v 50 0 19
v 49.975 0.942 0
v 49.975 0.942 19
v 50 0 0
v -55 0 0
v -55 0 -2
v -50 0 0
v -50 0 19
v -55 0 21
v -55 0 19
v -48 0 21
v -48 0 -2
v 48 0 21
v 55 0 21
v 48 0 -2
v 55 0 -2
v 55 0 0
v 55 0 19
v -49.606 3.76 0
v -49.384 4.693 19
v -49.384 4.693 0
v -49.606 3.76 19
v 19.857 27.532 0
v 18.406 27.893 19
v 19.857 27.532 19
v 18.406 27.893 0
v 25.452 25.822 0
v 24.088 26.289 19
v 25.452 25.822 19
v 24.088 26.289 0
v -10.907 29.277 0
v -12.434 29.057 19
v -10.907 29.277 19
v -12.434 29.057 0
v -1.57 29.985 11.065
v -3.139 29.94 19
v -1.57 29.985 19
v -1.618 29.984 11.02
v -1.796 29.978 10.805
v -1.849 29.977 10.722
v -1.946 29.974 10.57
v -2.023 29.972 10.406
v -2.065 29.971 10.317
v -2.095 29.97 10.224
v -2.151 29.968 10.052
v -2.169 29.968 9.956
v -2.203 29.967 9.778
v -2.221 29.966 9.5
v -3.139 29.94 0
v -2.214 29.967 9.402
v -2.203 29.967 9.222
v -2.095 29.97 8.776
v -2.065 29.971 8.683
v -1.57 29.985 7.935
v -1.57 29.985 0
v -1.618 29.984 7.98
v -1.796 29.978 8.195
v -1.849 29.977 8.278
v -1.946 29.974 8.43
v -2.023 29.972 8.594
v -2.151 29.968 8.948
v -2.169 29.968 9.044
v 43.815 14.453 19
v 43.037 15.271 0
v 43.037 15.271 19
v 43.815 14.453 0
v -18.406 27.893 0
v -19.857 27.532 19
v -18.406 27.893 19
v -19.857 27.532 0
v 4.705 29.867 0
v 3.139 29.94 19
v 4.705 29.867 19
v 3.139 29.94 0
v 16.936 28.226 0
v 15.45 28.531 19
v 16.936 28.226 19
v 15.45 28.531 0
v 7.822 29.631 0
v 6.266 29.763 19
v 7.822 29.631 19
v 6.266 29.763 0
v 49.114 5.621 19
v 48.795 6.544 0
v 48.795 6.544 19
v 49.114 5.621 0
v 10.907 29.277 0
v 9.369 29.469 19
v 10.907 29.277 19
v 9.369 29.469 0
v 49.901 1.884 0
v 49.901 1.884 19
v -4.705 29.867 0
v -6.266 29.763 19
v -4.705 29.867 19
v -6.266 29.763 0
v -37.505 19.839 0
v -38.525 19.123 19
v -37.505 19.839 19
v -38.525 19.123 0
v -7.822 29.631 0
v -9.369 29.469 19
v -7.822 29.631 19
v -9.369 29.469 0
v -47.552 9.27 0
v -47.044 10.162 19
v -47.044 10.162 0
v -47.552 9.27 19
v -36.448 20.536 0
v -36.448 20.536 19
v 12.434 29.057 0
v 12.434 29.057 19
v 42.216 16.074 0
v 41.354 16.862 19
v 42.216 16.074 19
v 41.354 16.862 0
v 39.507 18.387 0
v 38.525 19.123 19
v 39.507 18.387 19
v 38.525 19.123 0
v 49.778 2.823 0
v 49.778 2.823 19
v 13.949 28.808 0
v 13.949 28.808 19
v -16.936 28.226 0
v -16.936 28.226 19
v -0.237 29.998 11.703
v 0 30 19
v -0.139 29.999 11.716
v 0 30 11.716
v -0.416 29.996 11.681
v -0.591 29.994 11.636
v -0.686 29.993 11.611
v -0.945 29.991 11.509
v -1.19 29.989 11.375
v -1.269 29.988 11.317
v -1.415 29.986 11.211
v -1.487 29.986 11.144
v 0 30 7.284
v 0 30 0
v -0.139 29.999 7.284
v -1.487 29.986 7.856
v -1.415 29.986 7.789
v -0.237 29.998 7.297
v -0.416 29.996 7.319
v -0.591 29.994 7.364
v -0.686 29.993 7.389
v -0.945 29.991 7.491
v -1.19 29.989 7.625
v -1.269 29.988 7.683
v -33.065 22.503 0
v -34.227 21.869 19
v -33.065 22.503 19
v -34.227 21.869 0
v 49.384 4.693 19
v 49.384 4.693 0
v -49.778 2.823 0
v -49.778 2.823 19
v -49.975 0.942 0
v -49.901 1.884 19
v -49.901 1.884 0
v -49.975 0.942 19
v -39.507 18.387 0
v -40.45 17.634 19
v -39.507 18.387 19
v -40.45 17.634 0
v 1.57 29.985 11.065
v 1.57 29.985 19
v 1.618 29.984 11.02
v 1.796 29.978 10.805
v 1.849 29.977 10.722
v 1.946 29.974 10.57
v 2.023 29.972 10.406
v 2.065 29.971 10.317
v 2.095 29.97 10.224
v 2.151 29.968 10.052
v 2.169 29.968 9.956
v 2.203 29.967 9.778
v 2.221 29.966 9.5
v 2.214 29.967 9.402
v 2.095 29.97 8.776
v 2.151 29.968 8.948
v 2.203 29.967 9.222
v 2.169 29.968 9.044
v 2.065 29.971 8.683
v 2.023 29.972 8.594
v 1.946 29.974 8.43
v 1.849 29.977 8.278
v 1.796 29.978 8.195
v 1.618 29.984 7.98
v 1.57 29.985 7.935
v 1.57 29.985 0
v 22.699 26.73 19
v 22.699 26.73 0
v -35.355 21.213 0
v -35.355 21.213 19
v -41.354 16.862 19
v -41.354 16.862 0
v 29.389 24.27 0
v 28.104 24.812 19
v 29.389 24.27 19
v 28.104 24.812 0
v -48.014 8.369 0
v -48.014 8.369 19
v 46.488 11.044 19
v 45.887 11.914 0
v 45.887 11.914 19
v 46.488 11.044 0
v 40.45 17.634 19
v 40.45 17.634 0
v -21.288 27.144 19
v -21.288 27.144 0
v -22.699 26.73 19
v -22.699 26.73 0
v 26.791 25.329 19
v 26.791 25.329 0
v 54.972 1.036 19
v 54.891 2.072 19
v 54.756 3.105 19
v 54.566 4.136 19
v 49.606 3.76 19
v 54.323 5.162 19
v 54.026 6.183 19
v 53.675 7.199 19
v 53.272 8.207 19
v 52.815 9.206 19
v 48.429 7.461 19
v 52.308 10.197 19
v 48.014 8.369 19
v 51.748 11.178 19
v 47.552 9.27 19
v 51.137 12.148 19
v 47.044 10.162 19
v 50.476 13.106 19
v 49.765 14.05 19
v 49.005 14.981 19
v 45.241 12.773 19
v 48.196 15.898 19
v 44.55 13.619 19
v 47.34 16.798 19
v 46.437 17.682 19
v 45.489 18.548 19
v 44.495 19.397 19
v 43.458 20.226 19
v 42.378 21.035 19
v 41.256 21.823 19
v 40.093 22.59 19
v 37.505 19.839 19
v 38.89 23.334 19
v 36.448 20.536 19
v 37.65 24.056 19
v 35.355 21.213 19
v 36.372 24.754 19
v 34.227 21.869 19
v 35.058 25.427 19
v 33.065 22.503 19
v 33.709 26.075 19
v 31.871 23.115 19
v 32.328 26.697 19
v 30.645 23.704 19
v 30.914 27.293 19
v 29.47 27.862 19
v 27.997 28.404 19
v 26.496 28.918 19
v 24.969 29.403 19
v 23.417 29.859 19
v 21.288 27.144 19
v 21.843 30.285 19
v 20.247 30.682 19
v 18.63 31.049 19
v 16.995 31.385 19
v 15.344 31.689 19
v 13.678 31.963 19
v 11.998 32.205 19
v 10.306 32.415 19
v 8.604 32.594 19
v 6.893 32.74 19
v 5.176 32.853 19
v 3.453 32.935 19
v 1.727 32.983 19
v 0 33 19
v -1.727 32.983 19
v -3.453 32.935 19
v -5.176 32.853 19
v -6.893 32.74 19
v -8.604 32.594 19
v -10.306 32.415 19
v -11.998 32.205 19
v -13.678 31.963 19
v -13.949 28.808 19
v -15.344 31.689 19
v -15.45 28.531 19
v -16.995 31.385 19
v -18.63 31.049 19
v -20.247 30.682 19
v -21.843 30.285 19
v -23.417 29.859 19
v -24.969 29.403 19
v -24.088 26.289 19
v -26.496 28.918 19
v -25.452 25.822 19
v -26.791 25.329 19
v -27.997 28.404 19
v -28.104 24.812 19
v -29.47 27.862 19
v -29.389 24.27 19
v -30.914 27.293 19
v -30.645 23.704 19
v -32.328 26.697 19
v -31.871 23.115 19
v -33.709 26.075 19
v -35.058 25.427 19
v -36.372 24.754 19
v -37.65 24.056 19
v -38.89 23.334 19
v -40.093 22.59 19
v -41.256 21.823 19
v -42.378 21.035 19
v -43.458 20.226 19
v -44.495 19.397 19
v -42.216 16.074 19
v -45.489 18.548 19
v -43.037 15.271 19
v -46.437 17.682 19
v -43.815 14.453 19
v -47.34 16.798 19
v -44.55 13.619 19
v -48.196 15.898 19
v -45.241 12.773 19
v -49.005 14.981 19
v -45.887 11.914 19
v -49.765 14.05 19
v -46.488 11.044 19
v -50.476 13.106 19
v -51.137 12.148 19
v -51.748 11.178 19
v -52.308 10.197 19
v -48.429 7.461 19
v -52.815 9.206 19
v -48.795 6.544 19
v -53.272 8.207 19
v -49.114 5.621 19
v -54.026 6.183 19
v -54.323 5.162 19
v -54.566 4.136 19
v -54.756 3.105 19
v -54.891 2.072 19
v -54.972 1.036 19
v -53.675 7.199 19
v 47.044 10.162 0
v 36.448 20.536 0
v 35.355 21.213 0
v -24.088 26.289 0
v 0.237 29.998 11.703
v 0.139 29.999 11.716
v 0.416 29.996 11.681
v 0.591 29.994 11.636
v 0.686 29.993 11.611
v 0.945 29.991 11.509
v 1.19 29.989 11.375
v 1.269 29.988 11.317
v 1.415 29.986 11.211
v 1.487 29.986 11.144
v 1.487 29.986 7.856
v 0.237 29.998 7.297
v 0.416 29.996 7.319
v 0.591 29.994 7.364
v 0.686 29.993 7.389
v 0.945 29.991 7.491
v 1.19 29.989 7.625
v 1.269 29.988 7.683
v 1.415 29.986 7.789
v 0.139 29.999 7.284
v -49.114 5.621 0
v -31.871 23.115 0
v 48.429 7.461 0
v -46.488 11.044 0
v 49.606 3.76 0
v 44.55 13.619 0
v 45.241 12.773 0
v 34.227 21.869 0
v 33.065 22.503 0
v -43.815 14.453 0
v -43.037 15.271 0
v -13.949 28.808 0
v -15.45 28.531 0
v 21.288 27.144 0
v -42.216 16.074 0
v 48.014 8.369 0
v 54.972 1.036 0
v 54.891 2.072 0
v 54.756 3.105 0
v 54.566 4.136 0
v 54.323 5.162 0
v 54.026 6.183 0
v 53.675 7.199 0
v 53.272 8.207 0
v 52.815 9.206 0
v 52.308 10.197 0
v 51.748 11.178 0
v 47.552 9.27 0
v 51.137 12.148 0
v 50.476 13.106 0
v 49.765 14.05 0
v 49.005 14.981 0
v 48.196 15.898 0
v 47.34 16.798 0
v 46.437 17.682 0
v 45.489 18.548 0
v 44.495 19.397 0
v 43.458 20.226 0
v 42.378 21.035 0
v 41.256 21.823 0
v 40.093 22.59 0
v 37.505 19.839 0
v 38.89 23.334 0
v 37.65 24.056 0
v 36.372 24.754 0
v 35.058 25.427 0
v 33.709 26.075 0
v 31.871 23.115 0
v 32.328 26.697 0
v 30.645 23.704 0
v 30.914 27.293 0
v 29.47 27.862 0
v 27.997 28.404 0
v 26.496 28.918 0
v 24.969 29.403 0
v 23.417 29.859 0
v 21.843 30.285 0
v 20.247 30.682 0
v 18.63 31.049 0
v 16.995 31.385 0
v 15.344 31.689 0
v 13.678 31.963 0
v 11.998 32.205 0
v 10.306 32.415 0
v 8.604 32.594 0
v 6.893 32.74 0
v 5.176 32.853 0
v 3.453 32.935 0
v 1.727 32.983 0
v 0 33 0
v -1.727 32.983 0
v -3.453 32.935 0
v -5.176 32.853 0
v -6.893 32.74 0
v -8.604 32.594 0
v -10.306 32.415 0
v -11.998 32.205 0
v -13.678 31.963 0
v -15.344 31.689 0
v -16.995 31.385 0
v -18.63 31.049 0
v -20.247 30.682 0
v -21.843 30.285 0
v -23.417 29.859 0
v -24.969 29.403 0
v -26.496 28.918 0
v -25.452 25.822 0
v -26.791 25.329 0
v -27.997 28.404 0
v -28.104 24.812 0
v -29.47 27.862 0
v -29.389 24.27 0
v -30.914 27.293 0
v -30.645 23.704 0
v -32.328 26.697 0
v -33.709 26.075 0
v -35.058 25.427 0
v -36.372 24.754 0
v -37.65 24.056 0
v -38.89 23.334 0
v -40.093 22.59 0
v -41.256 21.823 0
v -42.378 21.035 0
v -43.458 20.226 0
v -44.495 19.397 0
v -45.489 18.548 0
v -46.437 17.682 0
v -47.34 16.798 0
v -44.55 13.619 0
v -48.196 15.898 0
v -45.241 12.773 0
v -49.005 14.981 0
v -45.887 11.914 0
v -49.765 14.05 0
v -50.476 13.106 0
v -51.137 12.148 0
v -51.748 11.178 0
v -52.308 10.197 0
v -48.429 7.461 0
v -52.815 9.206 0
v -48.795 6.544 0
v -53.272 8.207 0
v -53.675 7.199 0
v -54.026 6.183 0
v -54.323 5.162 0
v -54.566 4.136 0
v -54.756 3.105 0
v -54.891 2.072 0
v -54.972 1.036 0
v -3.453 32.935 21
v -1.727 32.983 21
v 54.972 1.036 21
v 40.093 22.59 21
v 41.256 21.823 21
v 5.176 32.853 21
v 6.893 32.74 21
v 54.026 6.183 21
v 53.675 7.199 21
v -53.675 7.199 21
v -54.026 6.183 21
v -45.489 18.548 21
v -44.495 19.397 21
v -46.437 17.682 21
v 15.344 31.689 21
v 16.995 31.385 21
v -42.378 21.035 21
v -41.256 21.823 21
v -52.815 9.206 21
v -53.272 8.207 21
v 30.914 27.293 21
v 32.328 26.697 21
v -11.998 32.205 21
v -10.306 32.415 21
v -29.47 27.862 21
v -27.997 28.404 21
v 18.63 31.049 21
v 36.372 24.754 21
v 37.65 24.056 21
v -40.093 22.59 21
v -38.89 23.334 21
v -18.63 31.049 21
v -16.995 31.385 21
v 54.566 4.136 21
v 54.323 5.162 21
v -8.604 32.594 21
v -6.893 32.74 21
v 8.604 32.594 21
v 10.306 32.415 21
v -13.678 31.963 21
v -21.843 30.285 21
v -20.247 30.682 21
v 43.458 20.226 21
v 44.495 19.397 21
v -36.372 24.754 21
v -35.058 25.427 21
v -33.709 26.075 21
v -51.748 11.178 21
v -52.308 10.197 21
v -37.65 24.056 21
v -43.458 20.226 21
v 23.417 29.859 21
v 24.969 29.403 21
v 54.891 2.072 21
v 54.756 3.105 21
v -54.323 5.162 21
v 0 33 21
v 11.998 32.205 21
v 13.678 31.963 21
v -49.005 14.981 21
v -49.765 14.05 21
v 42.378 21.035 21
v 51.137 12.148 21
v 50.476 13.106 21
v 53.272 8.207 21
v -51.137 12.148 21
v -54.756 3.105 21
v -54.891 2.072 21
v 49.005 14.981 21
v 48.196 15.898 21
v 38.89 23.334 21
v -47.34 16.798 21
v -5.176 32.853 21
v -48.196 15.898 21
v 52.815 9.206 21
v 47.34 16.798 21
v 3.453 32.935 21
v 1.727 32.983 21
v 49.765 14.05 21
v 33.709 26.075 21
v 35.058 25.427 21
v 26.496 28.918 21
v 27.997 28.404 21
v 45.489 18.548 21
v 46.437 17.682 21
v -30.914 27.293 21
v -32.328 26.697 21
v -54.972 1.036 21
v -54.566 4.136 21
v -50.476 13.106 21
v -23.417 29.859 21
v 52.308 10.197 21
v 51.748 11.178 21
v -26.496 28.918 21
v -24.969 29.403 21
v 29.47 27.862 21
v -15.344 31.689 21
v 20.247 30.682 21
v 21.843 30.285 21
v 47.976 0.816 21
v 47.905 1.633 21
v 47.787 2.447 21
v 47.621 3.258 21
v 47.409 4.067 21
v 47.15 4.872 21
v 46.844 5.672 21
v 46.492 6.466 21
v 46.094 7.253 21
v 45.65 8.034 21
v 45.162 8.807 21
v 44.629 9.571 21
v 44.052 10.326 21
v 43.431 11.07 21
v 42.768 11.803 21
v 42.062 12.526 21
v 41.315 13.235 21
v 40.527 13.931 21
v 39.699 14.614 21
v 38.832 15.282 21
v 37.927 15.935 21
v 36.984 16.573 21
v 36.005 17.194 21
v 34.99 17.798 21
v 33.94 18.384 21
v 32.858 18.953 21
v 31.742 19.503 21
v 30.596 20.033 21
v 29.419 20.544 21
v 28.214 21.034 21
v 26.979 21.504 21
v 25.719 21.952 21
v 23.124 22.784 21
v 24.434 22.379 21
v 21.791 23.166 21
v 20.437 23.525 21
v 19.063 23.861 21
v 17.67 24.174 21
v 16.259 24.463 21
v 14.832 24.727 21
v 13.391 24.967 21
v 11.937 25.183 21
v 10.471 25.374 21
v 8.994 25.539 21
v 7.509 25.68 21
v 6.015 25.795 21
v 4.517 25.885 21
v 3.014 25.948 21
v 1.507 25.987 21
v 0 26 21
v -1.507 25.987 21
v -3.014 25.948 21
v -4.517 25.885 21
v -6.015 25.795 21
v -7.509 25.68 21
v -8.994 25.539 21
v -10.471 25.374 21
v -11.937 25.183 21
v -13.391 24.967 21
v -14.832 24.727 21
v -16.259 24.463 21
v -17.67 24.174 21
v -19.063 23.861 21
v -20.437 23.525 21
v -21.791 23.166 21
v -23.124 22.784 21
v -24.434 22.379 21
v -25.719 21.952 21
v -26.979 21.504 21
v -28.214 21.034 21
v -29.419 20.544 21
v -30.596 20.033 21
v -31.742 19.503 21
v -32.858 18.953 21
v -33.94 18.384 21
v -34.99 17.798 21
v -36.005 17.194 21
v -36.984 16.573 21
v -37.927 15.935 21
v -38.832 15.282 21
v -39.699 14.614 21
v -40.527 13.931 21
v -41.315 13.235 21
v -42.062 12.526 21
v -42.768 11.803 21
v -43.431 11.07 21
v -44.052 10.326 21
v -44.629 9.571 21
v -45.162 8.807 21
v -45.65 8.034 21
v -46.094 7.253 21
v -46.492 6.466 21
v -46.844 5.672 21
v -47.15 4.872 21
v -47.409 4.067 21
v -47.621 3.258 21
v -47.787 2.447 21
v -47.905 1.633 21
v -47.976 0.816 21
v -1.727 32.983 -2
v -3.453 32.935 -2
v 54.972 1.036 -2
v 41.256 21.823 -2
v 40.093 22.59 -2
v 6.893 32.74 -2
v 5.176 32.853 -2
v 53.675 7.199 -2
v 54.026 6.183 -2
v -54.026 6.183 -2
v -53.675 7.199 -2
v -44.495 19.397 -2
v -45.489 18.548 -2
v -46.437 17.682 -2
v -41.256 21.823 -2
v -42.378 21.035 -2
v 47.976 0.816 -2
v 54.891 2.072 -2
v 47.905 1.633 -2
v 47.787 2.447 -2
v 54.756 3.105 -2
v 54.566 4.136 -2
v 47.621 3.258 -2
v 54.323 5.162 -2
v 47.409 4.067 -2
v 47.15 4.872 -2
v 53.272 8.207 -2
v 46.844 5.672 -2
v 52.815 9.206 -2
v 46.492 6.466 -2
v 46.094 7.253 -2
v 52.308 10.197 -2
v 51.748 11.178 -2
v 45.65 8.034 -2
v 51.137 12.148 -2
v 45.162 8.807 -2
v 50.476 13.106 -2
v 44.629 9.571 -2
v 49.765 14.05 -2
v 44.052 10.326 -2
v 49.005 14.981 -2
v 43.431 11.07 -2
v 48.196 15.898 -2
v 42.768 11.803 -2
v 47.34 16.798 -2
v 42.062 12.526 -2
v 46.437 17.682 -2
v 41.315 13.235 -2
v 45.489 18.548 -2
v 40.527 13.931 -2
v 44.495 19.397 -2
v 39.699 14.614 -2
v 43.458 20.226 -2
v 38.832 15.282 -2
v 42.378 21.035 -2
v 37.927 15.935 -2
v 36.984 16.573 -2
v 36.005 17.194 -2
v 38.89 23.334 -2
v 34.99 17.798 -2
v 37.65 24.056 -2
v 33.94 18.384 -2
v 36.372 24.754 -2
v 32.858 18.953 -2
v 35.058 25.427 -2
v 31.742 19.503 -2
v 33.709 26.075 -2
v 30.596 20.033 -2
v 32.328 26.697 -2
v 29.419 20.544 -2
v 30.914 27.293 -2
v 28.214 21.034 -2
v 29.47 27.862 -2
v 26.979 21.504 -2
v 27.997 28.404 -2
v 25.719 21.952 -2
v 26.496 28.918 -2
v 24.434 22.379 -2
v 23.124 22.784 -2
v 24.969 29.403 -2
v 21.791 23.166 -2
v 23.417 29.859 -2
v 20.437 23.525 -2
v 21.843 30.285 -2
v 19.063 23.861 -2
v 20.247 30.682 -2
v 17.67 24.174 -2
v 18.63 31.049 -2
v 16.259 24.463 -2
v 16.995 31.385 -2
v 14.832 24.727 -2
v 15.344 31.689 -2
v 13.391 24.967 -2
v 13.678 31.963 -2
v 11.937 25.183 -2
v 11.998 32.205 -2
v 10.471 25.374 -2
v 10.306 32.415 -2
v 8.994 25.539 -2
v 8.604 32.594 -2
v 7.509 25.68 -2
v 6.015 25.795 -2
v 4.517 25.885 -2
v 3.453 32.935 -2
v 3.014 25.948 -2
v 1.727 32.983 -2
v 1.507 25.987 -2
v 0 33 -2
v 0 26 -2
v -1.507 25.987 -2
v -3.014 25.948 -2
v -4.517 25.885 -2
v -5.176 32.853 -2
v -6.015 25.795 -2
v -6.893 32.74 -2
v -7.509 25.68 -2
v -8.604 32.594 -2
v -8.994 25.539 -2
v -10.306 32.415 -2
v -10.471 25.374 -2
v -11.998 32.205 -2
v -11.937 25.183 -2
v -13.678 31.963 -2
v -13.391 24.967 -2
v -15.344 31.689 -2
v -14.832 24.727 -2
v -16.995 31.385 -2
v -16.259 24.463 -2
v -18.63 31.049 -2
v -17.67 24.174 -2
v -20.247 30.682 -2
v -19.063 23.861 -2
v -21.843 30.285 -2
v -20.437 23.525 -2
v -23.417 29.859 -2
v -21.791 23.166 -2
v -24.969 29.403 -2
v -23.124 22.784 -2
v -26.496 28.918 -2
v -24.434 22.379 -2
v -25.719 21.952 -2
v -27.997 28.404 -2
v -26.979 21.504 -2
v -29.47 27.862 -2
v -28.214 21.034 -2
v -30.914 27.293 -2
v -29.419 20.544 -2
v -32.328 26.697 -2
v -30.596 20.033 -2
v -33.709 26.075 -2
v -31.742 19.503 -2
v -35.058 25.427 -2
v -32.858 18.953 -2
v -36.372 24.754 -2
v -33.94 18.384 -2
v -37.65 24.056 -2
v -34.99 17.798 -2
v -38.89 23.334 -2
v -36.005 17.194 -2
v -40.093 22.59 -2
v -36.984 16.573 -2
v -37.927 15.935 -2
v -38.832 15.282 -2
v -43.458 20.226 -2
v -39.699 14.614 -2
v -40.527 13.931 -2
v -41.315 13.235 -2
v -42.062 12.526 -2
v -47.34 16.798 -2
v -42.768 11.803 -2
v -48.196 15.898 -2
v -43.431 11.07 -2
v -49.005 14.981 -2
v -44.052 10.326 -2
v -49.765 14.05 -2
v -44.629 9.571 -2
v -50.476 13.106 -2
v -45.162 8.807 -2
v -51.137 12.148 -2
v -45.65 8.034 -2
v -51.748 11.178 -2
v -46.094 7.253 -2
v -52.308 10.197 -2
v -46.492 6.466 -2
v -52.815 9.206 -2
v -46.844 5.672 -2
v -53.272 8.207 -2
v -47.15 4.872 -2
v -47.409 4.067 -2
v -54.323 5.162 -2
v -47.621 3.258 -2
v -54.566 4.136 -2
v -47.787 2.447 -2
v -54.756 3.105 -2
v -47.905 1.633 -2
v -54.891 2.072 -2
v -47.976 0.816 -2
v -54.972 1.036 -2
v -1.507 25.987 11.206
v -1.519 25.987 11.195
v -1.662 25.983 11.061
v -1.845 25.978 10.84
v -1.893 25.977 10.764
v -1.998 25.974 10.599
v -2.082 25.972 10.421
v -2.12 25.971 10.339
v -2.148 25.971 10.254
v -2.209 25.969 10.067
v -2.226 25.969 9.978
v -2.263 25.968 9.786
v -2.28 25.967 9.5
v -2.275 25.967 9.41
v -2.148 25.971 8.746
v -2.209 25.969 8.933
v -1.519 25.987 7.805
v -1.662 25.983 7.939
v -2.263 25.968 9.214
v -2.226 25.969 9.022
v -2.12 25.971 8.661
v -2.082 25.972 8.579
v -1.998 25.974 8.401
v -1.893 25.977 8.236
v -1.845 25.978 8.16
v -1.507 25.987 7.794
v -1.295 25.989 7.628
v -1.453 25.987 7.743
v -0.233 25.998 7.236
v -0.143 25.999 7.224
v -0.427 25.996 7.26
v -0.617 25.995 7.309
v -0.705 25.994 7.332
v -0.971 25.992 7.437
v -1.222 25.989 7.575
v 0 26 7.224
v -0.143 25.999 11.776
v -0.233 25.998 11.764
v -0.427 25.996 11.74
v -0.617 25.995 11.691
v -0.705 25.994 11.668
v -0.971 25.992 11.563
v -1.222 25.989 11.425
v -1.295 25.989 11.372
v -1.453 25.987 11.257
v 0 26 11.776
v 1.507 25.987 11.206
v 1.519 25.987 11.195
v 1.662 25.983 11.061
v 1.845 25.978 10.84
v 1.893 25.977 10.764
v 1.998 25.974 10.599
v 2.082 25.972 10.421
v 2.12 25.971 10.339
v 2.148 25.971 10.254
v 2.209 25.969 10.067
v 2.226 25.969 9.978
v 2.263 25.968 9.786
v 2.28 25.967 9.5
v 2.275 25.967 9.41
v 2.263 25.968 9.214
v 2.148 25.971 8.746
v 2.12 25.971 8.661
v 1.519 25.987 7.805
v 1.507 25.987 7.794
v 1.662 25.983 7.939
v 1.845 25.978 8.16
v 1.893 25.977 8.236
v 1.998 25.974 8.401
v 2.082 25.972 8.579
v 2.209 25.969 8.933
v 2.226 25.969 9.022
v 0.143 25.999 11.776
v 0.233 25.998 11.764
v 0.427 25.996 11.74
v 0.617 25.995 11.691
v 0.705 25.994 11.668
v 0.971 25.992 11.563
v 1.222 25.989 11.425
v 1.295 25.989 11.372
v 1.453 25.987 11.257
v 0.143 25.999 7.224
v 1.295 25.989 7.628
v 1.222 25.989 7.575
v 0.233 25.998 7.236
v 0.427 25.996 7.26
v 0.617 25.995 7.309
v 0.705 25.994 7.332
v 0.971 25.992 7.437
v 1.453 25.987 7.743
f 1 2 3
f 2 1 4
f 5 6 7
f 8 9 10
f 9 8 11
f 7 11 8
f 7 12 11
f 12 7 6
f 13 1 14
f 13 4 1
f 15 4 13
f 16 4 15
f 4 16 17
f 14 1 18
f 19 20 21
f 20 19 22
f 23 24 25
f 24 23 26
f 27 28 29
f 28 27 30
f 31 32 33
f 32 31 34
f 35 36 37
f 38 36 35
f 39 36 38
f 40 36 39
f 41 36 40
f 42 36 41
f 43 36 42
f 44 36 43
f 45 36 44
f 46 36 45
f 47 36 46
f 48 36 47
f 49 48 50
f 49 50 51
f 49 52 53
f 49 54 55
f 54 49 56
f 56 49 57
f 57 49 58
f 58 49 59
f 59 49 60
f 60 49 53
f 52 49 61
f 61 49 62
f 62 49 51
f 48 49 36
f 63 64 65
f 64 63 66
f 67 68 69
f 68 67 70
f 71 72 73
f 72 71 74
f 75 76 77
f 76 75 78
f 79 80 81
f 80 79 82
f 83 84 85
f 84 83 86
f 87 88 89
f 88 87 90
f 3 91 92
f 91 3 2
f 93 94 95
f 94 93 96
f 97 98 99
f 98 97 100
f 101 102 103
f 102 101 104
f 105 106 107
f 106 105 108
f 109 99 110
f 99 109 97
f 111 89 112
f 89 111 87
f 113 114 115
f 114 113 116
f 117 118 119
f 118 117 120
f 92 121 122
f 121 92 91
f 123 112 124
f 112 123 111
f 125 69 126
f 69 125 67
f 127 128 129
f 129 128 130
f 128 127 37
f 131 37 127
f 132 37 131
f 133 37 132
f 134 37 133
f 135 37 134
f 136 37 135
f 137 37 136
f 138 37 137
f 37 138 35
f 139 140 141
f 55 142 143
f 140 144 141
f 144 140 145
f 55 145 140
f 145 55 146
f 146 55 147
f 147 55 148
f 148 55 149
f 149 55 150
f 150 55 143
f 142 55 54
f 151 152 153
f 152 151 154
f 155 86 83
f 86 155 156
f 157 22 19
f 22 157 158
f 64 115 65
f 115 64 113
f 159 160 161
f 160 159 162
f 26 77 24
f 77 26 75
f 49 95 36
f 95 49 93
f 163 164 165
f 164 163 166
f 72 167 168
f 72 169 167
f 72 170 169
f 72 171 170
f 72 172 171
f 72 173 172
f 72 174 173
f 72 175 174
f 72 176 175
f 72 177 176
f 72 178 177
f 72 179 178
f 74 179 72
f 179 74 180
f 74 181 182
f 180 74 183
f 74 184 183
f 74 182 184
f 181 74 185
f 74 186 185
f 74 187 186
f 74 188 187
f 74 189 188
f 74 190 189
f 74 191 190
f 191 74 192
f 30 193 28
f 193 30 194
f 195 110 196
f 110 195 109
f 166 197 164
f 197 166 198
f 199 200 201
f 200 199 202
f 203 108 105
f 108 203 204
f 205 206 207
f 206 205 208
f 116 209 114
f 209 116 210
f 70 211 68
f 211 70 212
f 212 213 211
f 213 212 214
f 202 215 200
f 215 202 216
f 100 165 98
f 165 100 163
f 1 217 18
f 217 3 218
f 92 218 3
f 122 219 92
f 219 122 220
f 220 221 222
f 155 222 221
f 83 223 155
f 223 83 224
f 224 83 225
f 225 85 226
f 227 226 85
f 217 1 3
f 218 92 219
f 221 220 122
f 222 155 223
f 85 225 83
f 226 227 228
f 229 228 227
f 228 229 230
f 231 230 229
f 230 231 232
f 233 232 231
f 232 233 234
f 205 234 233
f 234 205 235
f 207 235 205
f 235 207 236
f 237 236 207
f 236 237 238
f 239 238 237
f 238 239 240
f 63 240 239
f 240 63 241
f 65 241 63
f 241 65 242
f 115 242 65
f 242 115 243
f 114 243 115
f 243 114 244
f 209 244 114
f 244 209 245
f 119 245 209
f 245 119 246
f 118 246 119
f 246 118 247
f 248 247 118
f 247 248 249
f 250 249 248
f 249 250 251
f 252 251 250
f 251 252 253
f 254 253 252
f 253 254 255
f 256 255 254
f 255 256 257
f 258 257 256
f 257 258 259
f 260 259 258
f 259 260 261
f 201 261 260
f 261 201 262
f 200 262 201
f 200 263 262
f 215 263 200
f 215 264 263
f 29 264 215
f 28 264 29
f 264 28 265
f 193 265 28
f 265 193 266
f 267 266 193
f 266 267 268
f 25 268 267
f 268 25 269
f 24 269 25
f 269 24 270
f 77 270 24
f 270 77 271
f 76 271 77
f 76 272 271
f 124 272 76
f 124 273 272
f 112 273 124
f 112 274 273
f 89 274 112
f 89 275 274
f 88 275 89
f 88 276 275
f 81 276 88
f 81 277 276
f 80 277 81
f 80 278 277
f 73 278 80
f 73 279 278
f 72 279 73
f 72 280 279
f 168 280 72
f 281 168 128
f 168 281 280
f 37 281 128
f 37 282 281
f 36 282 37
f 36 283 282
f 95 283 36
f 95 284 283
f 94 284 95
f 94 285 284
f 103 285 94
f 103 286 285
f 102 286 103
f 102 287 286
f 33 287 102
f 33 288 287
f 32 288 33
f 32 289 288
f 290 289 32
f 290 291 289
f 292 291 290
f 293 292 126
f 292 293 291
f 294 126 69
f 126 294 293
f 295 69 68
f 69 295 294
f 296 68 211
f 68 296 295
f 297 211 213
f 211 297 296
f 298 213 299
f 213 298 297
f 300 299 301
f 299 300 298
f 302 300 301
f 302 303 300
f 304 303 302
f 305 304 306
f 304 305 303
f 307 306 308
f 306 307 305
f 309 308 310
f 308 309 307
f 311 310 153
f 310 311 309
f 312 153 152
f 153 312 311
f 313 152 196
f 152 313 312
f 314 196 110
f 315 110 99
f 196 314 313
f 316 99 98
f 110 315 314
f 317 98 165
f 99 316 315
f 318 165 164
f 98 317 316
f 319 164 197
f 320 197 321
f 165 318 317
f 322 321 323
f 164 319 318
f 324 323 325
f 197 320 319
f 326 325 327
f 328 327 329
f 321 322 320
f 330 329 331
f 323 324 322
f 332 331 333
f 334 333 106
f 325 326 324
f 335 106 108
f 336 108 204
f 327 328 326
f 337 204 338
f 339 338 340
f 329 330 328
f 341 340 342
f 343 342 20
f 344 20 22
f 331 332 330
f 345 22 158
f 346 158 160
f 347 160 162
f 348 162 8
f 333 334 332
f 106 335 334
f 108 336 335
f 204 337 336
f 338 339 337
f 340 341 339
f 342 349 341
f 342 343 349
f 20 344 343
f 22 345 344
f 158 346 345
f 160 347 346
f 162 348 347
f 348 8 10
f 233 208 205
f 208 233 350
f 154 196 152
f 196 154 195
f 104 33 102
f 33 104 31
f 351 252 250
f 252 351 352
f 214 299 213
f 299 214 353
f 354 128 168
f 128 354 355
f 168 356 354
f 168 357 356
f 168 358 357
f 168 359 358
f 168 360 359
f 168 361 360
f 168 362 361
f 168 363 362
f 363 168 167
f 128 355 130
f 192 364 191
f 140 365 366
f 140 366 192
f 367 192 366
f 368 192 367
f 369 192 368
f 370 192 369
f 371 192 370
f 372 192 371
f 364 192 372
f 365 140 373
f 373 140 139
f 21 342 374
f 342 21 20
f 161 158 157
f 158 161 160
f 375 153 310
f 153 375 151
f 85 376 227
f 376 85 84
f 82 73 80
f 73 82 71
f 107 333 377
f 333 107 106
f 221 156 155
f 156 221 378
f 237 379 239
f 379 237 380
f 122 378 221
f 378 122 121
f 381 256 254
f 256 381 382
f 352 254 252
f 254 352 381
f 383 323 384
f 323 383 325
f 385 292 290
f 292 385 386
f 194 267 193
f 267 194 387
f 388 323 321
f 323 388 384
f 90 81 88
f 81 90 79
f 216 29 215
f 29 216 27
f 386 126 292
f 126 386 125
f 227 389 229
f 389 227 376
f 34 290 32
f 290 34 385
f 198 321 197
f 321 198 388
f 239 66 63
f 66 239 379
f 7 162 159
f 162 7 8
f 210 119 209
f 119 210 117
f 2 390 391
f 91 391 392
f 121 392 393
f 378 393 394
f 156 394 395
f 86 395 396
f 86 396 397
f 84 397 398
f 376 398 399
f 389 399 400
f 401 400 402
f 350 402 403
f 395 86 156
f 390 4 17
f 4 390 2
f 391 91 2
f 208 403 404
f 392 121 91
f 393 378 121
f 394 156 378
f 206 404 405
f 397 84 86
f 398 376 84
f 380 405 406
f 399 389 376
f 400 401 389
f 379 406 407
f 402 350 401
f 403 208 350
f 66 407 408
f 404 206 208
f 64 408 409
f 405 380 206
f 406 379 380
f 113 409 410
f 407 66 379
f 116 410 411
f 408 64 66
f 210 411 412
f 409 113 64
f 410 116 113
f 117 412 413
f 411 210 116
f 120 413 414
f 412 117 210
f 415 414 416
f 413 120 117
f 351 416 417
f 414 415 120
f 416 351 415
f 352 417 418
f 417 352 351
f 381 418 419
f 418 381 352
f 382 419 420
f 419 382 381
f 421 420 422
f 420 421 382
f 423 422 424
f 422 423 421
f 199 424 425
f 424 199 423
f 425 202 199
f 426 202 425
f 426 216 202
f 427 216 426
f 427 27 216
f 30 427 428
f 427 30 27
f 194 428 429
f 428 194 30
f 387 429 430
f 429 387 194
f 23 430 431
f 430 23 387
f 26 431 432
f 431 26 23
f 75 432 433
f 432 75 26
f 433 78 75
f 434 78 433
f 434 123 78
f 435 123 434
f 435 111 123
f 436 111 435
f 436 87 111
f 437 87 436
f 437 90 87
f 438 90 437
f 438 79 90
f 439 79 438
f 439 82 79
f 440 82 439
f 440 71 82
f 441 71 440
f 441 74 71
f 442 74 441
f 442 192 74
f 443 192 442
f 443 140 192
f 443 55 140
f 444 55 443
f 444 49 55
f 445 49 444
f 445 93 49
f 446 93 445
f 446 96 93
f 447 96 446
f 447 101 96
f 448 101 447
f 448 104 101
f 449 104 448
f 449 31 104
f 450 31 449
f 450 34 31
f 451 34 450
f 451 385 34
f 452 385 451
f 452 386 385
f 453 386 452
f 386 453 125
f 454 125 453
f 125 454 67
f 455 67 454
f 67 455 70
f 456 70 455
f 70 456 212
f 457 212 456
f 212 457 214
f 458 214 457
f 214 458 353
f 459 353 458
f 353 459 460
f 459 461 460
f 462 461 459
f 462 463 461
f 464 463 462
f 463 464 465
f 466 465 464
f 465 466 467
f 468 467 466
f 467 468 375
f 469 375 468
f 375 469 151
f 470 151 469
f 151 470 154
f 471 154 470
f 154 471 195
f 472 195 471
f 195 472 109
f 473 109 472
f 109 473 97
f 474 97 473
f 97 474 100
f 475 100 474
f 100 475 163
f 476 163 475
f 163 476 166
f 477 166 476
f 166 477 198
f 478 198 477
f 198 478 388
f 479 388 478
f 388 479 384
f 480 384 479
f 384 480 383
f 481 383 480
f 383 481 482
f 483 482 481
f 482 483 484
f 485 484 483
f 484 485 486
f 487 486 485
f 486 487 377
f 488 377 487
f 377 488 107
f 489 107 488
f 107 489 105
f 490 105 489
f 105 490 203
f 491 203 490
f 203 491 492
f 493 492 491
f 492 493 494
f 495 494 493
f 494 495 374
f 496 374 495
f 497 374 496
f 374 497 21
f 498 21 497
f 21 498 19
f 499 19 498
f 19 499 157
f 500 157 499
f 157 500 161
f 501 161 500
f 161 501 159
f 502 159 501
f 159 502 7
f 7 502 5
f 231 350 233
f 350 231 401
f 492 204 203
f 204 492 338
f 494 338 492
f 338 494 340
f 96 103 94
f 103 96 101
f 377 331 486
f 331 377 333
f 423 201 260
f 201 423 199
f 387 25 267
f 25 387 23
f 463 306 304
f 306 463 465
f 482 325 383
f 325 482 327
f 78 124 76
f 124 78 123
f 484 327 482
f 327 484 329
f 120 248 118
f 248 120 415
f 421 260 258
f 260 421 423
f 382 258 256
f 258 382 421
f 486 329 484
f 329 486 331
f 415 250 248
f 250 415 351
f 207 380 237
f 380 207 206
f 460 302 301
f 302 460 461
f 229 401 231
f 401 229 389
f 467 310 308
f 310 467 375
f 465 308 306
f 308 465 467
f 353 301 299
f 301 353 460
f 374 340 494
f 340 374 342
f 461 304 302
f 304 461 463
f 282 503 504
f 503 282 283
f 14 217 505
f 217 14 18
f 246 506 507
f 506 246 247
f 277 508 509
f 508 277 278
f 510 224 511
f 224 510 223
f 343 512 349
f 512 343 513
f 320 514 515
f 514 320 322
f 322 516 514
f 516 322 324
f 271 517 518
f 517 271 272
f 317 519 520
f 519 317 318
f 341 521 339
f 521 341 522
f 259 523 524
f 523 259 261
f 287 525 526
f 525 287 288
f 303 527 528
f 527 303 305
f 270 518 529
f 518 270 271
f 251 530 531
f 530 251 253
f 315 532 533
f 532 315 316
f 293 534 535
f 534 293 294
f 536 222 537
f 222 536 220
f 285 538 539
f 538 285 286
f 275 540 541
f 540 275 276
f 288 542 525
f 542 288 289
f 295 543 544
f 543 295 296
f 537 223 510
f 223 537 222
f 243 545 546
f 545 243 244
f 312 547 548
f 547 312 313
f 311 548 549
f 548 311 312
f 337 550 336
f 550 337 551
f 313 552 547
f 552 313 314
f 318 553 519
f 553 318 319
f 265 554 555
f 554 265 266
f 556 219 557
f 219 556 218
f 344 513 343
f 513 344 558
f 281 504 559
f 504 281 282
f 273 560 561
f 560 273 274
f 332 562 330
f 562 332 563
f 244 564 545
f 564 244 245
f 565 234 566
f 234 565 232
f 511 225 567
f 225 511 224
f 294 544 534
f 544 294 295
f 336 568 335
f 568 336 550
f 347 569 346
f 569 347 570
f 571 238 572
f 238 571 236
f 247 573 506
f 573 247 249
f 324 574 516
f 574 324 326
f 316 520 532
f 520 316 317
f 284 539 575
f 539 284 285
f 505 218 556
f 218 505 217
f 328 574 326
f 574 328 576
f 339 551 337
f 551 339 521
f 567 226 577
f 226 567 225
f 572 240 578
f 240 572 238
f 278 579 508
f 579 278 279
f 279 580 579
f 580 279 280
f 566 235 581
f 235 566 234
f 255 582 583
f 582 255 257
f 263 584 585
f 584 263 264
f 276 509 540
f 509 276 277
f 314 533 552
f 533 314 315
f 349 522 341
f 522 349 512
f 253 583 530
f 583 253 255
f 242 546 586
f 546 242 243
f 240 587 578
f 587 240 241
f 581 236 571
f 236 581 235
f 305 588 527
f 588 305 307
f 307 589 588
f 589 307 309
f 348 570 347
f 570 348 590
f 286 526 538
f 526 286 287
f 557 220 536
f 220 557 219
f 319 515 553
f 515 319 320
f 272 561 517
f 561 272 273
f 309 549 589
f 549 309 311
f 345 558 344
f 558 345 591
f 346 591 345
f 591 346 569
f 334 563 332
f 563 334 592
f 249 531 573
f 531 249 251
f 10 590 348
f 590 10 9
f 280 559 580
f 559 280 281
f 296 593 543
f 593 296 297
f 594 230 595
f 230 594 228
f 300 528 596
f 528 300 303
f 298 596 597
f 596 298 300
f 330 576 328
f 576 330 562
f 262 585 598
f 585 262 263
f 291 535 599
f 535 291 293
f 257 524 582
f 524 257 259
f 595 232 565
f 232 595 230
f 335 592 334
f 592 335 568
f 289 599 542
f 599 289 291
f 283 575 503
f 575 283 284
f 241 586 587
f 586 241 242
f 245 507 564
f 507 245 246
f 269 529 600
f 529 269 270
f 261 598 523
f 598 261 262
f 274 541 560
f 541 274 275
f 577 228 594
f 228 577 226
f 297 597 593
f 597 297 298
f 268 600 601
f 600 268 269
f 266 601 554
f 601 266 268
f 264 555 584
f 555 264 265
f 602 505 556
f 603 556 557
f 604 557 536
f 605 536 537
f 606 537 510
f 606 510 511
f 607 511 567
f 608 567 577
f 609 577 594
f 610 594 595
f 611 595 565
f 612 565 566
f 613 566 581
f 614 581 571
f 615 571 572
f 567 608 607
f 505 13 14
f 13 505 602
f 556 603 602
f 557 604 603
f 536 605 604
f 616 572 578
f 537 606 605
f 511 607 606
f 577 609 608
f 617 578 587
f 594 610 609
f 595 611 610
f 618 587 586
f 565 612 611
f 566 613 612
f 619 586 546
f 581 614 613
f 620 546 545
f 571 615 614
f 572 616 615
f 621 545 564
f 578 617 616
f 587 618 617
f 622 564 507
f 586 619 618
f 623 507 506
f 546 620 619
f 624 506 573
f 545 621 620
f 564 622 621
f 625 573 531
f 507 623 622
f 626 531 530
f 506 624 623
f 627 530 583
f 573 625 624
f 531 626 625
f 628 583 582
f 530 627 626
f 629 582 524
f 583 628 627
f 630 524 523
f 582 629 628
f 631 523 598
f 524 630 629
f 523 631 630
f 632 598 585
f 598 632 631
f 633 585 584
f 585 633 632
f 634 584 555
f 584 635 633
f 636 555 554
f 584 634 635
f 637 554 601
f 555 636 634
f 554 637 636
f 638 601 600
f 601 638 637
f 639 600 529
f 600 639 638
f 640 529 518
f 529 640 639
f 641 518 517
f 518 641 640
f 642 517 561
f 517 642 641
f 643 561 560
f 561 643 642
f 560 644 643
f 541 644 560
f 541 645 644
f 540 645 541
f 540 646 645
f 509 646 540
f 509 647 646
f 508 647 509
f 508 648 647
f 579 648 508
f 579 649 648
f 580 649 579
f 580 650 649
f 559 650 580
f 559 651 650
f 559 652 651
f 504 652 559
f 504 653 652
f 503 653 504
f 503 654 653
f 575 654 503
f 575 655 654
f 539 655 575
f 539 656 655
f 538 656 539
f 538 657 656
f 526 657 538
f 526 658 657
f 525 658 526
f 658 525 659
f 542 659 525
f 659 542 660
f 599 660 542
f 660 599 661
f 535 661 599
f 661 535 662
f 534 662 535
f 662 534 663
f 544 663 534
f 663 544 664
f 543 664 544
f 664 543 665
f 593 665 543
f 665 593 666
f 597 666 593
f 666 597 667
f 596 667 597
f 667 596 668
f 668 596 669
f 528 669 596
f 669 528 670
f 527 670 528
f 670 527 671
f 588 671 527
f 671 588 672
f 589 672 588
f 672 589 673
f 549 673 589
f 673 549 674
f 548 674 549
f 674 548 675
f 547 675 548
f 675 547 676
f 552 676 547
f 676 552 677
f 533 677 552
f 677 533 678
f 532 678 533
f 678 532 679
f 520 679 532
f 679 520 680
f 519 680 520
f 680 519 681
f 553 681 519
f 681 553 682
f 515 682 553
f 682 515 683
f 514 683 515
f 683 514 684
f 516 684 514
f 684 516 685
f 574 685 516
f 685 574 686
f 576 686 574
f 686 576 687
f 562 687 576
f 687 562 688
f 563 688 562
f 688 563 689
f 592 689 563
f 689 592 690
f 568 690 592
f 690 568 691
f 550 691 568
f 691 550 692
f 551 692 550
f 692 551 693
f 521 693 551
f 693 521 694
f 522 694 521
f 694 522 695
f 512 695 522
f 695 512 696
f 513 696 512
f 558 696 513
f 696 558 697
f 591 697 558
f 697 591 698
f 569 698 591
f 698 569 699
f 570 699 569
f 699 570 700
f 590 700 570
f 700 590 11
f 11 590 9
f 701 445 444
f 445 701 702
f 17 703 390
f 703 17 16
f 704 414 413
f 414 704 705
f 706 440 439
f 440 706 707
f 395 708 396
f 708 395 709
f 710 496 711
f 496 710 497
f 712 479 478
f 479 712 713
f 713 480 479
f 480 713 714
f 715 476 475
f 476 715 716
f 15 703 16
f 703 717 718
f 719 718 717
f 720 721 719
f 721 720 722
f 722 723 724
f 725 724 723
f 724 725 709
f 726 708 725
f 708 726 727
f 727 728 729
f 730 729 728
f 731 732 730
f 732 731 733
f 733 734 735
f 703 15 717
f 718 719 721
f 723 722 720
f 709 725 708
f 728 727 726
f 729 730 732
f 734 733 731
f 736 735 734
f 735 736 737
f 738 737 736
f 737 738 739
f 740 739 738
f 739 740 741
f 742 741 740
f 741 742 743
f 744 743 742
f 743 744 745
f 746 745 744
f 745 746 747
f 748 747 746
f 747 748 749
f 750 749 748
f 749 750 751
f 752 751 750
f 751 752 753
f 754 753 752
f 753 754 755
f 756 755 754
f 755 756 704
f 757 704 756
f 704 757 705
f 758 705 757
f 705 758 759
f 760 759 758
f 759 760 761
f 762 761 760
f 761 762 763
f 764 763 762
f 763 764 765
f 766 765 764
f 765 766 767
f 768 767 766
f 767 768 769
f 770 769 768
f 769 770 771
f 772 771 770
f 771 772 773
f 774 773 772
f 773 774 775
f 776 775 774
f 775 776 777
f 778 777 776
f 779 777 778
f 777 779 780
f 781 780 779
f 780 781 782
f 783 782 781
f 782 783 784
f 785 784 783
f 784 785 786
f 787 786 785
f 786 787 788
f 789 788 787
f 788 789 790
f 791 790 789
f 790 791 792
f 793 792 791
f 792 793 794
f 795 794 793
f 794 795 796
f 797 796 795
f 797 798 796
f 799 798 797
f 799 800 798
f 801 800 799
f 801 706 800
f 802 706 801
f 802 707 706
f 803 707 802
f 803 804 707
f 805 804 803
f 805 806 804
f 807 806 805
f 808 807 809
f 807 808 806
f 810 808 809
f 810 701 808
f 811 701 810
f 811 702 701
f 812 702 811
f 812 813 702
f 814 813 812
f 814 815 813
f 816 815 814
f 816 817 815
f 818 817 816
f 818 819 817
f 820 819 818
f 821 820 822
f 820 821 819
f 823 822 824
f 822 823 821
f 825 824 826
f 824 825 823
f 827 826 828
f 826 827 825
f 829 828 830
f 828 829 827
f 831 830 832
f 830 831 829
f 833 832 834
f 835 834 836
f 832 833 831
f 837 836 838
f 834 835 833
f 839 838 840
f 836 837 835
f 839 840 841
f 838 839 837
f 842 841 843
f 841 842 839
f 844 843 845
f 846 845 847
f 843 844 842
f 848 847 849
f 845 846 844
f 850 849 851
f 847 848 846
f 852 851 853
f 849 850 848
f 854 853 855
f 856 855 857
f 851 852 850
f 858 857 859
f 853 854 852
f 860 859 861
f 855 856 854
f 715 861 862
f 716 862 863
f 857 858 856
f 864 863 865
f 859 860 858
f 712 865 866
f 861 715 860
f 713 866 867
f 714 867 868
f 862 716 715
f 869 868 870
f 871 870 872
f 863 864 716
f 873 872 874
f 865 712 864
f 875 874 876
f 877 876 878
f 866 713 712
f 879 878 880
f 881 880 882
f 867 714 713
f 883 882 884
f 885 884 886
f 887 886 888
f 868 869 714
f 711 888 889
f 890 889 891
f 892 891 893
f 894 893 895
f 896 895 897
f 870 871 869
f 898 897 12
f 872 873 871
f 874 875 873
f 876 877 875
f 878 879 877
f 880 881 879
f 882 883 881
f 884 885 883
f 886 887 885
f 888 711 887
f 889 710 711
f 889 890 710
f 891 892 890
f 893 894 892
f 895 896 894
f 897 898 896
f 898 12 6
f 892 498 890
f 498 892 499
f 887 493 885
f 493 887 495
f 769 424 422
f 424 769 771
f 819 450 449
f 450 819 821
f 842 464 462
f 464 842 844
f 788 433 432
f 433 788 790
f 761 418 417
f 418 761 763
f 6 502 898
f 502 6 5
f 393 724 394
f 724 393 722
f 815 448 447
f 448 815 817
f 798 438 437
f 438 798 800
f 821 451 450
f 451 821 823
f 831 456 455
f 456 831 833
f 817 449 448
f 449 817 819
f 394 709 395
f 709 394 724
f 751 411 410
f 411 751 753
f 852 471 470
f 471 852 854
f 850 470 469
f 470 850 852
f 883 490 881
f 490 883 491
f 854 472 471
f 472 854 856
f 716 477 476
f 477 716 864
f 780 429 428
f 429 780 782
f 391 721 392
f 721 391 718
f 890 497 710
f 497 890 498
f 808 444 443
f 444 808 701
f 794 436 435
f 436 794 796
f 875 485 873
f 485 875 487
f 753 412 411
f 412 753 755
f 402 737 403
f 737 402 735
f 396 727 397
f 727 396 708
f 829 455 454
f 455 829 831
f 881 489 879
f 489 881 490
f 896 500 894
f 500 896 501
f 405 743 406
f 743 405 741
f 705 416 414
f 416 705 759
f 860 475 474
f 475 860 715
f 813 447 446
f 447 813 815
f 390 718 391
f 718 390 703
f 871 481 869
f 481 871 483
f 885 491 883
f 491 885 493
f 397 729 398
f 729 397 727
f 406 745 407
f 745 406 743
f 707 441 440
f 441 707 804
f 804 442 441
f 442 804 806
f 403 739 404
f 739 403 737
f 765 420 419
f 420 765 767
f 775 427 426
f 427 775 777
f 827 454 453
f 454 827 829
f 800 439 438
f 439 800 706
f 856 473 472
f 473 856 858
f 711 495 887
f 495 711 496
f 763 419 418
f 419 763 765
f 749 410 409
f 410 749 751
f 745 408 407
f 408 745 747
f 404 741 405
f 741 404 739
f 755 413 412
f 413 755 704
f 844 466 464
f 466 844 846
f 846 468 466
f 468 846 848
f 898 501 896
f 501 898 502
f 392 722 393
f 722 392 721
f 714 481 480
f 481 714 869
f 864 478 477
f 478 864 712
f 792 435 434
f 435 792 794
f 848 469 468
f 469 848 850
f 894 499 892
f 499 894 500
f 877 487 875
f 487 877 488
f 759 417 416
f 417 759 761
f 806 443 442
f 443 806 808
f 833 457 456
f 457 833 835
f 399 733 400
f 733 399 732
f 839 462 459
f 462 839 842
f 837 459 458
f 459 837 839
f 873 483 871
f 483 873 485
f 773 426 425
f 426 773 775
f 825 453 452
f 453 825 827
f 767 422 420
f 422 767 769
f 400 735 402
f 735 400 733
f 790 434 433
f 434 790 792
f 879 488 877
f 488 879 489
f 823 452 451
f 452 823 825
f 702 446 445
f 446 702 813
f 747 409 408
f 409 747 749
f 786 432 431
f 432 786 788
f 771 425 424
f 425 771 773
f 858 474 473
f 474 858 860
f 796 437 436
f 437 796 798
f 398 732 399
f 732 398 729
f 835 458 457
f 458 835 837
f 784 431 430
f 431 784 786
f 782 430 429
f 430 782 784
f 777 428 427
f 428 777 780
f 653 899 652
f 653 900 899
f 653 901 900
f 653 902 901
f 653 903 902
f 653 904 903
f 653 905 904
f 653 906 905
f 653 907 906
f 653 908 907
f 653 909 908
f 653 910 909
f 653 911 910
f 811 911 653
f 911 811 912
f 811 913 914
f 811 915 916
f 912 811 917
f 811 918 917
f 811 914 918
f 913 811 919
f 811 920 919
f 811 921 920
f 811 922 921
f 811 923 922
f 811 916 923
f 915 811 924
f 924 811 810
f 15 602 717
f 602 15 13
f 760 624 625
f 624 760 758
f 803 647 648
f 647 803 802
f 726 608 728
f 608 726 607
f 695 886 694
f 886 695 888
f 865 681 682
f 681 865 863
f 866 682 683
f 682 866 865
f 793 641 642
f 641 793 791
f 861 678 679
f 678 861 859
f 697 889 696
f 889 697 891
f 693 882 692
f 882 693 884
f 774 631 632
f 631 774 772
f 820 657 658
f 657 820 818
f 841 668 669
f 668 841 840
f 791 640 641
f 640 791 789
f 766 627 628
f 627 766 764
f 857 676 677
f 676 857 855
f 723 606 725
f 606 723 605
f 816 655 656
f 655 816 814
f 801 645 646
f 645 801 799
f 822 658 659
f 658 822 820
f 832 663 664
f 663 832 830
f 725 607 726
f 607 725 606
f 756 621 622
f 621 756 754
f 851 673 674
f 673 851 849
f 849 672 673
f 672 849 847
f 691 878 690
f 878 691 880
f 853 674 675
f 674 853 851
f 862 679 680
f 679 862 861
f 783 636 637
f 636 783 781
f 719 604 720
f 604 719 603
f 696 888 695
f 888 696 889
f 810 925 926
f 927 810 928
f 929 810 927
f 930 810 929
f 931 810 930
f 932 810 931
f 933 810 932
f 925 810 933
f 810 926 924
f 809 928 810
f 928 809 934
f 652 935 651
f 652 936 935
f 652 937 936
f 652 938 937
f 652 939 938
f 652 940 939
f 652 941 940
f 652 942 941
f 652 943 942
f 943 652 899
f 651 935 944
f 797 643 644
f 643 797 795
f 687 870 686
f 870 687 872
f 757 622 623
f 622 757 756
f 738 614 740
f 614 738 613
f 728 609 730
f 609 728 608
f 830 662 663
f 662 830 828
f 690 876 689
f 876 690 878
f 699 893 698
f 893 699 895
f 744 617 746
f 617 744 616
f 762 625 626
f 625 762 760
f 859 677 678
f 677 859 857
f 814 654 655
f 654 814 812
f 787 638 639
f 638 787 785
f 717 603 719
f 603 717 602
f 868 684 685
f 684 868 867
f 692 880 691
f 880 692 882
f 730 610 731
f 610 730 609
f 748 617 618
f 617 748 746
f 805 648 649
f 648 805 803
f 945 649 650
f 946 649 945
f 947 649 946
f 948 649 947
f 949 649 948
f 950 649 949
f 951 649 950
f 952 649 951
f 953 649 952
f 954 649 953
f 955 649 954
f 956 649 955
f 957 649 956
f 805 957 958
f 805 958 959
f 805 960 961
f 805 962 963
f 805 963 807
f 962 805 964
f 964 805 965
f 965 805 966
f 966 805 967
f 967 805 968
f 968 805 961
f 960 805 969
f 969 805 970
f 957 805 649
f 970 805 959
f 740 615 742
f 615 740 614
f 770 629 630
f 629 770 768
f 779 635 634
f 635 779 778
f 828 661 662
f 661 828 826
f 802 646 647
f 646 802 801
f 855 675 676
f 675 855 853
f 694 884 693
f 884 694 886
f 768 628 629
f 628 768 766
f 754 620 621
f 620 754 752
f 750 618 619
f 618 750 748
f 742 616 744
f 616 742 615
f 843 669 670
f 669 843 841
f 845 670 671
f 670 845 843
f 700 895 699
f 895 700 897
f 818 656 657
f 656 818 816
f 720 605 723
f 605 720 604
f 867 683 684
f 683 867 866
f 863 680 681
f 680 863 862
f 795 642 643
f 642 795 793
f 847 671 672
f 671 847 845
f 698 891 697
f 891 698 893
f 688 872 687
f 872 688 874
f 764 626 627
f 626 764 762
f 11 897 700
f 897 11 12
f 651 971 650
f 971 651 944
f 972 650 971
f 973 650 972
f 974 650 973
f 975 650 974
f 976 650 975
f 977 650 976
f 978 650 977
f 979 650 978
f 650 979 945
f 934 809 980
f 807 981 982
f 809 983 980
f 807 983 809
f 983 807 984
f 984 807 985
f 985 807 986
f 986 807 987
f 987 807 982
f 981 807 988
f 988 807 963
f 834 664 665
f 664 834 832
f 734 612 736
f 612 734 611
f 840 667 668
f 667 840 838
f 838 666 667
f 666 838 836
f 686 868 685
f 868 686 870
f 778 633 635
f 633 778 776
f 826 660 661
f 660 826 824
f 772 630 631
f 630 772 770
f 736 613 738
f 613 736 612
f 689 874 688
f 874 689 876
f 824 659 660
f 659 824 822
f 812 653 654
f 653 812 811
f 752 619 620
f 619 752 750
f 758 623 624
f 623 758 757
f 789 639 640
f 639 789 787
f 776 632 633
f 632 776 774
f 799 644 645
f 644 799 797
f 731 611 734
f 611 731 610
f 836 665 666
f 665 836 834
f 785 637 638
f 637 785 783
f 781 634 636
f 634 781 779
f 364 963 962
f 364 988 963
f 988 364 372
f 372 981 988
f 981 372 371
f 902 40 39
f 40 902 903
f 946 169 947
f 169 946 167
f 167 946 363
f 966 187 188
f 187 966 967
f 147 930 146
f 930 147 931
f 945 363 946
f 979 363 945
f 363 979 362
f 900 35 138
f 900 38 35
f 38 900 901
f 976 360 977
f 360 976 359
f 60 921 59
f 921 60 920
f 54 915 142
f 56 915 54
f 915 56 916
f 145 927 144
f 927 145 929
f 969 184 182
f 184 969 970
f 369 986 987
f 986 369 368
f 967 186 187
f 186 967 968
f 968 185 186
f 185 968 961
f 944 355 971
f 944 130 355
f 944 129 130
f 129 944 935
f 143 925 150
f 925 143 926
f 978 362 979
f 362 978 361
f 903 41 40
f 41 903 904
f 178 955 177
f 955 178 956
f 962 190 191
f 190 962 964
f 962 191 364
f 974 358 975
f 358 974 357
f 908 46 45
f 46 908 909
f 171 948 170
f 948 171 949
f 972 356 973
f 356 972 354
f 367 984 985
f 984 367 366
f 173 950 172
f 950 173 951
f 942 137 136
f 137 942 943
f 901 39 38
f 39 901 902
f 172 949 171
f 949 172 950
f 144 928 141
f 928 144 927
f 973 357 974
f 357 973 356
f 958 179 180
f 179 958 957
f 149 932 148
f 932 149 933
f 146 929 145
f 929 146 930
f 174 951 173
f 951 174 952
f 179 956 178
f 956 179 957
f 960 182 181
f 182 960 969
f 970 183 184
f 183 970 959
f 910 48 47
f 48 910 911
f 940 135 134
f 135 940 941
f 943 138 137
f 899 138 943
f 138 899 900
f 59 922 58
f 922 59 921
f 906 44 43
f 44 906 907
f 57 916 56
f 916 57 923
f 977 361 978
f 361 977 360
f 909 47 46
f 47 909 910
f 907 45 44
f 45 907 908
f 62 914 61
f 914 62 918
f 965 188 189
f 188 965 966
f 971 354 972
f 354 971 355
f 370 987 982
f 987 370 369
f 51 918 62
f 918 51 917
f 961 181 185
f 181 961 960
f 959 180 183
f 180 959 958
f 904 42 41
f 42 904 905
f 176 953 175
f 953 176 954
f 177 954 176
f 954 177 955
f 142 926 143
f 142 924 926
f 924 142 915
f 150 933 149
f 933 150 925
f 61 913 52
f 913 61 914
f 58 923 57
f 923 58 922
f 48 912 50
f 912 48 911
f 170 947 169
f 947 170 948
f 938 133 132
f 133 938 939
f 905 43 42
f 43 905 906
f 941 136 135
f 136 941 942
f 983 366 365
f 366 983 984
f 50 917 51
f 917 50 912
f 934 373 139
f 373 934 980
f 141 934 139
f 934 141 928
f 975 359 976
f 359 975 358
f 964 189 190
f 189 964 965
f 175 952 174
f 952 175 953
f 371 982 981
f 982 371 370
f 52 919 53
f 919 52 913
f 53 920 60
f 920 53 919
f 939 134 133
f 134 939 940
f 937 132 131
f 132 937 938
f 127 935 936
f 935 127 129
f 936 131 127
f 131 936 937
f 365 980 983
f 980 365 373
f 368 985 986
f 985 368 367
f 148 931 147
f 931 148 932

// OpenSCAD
// === CUSTOMIZABLE PARAMETERS ===
outer_width = 100;     // Outer width of the half-oval (X-axis)
outer_height = 30;     // Outer height (Y-axis)
wall_thickness = 2;    // Wall thickness of the grommet
depth = 19;            // Total depth (Z-axis)
flange_height = 2;     // Height of the outer flange
flange_width = 10;     // Additional width of the outer flange
resolution = 100;      // Resolution for curves

module half_oval(w, h) {
    scale([w / 2, h])
        polygon(points = concat(
            [for (i = [0 : resolution]) [cos(i * 180 / resolution), sin(i * 180 / resolution)]],
            [[1, 0], [-1, 0]] // flat base
        ));
}

module grommet_body(w, h, d) {
    linear_extrude(height = d)
        half_oval(w, h);
}

module grommet_flange(w, h, offset) {
    translate([0, 0, offset])
        linear_extrude(height = flange_height)
            half_oval(w + flange_width, h + flange_width * (h / w));
}

module inner_cavity(w, h) {
    translate([0, 0, -flange_height])
        linear_extrude(height = depth + flange_height * 2)
            half_oval(w - 2 * wall_thickness, h - 2 * wall_thickness);
}


module screw_hole() {
    translate([0, outer_height - wall_thickness , depth / 2])  
        rotate([90, 0, 0])
            cylinder(h = outer_width, r1 = 1.5, r2 = 3, center = true, $fn = 50);
}


module half_grommet() {
    difference() {
        union() {
            grommet_body(outer_width, outer_height, depth);
            grommet_flange(outer_width, outer_height, depth); 
            grommet_flange(outer_width, outer_height, -flange_height);
        }
        inner_cavity(outer_width, outer_height);
        screw_hole();
    }
}

half_grommet();
